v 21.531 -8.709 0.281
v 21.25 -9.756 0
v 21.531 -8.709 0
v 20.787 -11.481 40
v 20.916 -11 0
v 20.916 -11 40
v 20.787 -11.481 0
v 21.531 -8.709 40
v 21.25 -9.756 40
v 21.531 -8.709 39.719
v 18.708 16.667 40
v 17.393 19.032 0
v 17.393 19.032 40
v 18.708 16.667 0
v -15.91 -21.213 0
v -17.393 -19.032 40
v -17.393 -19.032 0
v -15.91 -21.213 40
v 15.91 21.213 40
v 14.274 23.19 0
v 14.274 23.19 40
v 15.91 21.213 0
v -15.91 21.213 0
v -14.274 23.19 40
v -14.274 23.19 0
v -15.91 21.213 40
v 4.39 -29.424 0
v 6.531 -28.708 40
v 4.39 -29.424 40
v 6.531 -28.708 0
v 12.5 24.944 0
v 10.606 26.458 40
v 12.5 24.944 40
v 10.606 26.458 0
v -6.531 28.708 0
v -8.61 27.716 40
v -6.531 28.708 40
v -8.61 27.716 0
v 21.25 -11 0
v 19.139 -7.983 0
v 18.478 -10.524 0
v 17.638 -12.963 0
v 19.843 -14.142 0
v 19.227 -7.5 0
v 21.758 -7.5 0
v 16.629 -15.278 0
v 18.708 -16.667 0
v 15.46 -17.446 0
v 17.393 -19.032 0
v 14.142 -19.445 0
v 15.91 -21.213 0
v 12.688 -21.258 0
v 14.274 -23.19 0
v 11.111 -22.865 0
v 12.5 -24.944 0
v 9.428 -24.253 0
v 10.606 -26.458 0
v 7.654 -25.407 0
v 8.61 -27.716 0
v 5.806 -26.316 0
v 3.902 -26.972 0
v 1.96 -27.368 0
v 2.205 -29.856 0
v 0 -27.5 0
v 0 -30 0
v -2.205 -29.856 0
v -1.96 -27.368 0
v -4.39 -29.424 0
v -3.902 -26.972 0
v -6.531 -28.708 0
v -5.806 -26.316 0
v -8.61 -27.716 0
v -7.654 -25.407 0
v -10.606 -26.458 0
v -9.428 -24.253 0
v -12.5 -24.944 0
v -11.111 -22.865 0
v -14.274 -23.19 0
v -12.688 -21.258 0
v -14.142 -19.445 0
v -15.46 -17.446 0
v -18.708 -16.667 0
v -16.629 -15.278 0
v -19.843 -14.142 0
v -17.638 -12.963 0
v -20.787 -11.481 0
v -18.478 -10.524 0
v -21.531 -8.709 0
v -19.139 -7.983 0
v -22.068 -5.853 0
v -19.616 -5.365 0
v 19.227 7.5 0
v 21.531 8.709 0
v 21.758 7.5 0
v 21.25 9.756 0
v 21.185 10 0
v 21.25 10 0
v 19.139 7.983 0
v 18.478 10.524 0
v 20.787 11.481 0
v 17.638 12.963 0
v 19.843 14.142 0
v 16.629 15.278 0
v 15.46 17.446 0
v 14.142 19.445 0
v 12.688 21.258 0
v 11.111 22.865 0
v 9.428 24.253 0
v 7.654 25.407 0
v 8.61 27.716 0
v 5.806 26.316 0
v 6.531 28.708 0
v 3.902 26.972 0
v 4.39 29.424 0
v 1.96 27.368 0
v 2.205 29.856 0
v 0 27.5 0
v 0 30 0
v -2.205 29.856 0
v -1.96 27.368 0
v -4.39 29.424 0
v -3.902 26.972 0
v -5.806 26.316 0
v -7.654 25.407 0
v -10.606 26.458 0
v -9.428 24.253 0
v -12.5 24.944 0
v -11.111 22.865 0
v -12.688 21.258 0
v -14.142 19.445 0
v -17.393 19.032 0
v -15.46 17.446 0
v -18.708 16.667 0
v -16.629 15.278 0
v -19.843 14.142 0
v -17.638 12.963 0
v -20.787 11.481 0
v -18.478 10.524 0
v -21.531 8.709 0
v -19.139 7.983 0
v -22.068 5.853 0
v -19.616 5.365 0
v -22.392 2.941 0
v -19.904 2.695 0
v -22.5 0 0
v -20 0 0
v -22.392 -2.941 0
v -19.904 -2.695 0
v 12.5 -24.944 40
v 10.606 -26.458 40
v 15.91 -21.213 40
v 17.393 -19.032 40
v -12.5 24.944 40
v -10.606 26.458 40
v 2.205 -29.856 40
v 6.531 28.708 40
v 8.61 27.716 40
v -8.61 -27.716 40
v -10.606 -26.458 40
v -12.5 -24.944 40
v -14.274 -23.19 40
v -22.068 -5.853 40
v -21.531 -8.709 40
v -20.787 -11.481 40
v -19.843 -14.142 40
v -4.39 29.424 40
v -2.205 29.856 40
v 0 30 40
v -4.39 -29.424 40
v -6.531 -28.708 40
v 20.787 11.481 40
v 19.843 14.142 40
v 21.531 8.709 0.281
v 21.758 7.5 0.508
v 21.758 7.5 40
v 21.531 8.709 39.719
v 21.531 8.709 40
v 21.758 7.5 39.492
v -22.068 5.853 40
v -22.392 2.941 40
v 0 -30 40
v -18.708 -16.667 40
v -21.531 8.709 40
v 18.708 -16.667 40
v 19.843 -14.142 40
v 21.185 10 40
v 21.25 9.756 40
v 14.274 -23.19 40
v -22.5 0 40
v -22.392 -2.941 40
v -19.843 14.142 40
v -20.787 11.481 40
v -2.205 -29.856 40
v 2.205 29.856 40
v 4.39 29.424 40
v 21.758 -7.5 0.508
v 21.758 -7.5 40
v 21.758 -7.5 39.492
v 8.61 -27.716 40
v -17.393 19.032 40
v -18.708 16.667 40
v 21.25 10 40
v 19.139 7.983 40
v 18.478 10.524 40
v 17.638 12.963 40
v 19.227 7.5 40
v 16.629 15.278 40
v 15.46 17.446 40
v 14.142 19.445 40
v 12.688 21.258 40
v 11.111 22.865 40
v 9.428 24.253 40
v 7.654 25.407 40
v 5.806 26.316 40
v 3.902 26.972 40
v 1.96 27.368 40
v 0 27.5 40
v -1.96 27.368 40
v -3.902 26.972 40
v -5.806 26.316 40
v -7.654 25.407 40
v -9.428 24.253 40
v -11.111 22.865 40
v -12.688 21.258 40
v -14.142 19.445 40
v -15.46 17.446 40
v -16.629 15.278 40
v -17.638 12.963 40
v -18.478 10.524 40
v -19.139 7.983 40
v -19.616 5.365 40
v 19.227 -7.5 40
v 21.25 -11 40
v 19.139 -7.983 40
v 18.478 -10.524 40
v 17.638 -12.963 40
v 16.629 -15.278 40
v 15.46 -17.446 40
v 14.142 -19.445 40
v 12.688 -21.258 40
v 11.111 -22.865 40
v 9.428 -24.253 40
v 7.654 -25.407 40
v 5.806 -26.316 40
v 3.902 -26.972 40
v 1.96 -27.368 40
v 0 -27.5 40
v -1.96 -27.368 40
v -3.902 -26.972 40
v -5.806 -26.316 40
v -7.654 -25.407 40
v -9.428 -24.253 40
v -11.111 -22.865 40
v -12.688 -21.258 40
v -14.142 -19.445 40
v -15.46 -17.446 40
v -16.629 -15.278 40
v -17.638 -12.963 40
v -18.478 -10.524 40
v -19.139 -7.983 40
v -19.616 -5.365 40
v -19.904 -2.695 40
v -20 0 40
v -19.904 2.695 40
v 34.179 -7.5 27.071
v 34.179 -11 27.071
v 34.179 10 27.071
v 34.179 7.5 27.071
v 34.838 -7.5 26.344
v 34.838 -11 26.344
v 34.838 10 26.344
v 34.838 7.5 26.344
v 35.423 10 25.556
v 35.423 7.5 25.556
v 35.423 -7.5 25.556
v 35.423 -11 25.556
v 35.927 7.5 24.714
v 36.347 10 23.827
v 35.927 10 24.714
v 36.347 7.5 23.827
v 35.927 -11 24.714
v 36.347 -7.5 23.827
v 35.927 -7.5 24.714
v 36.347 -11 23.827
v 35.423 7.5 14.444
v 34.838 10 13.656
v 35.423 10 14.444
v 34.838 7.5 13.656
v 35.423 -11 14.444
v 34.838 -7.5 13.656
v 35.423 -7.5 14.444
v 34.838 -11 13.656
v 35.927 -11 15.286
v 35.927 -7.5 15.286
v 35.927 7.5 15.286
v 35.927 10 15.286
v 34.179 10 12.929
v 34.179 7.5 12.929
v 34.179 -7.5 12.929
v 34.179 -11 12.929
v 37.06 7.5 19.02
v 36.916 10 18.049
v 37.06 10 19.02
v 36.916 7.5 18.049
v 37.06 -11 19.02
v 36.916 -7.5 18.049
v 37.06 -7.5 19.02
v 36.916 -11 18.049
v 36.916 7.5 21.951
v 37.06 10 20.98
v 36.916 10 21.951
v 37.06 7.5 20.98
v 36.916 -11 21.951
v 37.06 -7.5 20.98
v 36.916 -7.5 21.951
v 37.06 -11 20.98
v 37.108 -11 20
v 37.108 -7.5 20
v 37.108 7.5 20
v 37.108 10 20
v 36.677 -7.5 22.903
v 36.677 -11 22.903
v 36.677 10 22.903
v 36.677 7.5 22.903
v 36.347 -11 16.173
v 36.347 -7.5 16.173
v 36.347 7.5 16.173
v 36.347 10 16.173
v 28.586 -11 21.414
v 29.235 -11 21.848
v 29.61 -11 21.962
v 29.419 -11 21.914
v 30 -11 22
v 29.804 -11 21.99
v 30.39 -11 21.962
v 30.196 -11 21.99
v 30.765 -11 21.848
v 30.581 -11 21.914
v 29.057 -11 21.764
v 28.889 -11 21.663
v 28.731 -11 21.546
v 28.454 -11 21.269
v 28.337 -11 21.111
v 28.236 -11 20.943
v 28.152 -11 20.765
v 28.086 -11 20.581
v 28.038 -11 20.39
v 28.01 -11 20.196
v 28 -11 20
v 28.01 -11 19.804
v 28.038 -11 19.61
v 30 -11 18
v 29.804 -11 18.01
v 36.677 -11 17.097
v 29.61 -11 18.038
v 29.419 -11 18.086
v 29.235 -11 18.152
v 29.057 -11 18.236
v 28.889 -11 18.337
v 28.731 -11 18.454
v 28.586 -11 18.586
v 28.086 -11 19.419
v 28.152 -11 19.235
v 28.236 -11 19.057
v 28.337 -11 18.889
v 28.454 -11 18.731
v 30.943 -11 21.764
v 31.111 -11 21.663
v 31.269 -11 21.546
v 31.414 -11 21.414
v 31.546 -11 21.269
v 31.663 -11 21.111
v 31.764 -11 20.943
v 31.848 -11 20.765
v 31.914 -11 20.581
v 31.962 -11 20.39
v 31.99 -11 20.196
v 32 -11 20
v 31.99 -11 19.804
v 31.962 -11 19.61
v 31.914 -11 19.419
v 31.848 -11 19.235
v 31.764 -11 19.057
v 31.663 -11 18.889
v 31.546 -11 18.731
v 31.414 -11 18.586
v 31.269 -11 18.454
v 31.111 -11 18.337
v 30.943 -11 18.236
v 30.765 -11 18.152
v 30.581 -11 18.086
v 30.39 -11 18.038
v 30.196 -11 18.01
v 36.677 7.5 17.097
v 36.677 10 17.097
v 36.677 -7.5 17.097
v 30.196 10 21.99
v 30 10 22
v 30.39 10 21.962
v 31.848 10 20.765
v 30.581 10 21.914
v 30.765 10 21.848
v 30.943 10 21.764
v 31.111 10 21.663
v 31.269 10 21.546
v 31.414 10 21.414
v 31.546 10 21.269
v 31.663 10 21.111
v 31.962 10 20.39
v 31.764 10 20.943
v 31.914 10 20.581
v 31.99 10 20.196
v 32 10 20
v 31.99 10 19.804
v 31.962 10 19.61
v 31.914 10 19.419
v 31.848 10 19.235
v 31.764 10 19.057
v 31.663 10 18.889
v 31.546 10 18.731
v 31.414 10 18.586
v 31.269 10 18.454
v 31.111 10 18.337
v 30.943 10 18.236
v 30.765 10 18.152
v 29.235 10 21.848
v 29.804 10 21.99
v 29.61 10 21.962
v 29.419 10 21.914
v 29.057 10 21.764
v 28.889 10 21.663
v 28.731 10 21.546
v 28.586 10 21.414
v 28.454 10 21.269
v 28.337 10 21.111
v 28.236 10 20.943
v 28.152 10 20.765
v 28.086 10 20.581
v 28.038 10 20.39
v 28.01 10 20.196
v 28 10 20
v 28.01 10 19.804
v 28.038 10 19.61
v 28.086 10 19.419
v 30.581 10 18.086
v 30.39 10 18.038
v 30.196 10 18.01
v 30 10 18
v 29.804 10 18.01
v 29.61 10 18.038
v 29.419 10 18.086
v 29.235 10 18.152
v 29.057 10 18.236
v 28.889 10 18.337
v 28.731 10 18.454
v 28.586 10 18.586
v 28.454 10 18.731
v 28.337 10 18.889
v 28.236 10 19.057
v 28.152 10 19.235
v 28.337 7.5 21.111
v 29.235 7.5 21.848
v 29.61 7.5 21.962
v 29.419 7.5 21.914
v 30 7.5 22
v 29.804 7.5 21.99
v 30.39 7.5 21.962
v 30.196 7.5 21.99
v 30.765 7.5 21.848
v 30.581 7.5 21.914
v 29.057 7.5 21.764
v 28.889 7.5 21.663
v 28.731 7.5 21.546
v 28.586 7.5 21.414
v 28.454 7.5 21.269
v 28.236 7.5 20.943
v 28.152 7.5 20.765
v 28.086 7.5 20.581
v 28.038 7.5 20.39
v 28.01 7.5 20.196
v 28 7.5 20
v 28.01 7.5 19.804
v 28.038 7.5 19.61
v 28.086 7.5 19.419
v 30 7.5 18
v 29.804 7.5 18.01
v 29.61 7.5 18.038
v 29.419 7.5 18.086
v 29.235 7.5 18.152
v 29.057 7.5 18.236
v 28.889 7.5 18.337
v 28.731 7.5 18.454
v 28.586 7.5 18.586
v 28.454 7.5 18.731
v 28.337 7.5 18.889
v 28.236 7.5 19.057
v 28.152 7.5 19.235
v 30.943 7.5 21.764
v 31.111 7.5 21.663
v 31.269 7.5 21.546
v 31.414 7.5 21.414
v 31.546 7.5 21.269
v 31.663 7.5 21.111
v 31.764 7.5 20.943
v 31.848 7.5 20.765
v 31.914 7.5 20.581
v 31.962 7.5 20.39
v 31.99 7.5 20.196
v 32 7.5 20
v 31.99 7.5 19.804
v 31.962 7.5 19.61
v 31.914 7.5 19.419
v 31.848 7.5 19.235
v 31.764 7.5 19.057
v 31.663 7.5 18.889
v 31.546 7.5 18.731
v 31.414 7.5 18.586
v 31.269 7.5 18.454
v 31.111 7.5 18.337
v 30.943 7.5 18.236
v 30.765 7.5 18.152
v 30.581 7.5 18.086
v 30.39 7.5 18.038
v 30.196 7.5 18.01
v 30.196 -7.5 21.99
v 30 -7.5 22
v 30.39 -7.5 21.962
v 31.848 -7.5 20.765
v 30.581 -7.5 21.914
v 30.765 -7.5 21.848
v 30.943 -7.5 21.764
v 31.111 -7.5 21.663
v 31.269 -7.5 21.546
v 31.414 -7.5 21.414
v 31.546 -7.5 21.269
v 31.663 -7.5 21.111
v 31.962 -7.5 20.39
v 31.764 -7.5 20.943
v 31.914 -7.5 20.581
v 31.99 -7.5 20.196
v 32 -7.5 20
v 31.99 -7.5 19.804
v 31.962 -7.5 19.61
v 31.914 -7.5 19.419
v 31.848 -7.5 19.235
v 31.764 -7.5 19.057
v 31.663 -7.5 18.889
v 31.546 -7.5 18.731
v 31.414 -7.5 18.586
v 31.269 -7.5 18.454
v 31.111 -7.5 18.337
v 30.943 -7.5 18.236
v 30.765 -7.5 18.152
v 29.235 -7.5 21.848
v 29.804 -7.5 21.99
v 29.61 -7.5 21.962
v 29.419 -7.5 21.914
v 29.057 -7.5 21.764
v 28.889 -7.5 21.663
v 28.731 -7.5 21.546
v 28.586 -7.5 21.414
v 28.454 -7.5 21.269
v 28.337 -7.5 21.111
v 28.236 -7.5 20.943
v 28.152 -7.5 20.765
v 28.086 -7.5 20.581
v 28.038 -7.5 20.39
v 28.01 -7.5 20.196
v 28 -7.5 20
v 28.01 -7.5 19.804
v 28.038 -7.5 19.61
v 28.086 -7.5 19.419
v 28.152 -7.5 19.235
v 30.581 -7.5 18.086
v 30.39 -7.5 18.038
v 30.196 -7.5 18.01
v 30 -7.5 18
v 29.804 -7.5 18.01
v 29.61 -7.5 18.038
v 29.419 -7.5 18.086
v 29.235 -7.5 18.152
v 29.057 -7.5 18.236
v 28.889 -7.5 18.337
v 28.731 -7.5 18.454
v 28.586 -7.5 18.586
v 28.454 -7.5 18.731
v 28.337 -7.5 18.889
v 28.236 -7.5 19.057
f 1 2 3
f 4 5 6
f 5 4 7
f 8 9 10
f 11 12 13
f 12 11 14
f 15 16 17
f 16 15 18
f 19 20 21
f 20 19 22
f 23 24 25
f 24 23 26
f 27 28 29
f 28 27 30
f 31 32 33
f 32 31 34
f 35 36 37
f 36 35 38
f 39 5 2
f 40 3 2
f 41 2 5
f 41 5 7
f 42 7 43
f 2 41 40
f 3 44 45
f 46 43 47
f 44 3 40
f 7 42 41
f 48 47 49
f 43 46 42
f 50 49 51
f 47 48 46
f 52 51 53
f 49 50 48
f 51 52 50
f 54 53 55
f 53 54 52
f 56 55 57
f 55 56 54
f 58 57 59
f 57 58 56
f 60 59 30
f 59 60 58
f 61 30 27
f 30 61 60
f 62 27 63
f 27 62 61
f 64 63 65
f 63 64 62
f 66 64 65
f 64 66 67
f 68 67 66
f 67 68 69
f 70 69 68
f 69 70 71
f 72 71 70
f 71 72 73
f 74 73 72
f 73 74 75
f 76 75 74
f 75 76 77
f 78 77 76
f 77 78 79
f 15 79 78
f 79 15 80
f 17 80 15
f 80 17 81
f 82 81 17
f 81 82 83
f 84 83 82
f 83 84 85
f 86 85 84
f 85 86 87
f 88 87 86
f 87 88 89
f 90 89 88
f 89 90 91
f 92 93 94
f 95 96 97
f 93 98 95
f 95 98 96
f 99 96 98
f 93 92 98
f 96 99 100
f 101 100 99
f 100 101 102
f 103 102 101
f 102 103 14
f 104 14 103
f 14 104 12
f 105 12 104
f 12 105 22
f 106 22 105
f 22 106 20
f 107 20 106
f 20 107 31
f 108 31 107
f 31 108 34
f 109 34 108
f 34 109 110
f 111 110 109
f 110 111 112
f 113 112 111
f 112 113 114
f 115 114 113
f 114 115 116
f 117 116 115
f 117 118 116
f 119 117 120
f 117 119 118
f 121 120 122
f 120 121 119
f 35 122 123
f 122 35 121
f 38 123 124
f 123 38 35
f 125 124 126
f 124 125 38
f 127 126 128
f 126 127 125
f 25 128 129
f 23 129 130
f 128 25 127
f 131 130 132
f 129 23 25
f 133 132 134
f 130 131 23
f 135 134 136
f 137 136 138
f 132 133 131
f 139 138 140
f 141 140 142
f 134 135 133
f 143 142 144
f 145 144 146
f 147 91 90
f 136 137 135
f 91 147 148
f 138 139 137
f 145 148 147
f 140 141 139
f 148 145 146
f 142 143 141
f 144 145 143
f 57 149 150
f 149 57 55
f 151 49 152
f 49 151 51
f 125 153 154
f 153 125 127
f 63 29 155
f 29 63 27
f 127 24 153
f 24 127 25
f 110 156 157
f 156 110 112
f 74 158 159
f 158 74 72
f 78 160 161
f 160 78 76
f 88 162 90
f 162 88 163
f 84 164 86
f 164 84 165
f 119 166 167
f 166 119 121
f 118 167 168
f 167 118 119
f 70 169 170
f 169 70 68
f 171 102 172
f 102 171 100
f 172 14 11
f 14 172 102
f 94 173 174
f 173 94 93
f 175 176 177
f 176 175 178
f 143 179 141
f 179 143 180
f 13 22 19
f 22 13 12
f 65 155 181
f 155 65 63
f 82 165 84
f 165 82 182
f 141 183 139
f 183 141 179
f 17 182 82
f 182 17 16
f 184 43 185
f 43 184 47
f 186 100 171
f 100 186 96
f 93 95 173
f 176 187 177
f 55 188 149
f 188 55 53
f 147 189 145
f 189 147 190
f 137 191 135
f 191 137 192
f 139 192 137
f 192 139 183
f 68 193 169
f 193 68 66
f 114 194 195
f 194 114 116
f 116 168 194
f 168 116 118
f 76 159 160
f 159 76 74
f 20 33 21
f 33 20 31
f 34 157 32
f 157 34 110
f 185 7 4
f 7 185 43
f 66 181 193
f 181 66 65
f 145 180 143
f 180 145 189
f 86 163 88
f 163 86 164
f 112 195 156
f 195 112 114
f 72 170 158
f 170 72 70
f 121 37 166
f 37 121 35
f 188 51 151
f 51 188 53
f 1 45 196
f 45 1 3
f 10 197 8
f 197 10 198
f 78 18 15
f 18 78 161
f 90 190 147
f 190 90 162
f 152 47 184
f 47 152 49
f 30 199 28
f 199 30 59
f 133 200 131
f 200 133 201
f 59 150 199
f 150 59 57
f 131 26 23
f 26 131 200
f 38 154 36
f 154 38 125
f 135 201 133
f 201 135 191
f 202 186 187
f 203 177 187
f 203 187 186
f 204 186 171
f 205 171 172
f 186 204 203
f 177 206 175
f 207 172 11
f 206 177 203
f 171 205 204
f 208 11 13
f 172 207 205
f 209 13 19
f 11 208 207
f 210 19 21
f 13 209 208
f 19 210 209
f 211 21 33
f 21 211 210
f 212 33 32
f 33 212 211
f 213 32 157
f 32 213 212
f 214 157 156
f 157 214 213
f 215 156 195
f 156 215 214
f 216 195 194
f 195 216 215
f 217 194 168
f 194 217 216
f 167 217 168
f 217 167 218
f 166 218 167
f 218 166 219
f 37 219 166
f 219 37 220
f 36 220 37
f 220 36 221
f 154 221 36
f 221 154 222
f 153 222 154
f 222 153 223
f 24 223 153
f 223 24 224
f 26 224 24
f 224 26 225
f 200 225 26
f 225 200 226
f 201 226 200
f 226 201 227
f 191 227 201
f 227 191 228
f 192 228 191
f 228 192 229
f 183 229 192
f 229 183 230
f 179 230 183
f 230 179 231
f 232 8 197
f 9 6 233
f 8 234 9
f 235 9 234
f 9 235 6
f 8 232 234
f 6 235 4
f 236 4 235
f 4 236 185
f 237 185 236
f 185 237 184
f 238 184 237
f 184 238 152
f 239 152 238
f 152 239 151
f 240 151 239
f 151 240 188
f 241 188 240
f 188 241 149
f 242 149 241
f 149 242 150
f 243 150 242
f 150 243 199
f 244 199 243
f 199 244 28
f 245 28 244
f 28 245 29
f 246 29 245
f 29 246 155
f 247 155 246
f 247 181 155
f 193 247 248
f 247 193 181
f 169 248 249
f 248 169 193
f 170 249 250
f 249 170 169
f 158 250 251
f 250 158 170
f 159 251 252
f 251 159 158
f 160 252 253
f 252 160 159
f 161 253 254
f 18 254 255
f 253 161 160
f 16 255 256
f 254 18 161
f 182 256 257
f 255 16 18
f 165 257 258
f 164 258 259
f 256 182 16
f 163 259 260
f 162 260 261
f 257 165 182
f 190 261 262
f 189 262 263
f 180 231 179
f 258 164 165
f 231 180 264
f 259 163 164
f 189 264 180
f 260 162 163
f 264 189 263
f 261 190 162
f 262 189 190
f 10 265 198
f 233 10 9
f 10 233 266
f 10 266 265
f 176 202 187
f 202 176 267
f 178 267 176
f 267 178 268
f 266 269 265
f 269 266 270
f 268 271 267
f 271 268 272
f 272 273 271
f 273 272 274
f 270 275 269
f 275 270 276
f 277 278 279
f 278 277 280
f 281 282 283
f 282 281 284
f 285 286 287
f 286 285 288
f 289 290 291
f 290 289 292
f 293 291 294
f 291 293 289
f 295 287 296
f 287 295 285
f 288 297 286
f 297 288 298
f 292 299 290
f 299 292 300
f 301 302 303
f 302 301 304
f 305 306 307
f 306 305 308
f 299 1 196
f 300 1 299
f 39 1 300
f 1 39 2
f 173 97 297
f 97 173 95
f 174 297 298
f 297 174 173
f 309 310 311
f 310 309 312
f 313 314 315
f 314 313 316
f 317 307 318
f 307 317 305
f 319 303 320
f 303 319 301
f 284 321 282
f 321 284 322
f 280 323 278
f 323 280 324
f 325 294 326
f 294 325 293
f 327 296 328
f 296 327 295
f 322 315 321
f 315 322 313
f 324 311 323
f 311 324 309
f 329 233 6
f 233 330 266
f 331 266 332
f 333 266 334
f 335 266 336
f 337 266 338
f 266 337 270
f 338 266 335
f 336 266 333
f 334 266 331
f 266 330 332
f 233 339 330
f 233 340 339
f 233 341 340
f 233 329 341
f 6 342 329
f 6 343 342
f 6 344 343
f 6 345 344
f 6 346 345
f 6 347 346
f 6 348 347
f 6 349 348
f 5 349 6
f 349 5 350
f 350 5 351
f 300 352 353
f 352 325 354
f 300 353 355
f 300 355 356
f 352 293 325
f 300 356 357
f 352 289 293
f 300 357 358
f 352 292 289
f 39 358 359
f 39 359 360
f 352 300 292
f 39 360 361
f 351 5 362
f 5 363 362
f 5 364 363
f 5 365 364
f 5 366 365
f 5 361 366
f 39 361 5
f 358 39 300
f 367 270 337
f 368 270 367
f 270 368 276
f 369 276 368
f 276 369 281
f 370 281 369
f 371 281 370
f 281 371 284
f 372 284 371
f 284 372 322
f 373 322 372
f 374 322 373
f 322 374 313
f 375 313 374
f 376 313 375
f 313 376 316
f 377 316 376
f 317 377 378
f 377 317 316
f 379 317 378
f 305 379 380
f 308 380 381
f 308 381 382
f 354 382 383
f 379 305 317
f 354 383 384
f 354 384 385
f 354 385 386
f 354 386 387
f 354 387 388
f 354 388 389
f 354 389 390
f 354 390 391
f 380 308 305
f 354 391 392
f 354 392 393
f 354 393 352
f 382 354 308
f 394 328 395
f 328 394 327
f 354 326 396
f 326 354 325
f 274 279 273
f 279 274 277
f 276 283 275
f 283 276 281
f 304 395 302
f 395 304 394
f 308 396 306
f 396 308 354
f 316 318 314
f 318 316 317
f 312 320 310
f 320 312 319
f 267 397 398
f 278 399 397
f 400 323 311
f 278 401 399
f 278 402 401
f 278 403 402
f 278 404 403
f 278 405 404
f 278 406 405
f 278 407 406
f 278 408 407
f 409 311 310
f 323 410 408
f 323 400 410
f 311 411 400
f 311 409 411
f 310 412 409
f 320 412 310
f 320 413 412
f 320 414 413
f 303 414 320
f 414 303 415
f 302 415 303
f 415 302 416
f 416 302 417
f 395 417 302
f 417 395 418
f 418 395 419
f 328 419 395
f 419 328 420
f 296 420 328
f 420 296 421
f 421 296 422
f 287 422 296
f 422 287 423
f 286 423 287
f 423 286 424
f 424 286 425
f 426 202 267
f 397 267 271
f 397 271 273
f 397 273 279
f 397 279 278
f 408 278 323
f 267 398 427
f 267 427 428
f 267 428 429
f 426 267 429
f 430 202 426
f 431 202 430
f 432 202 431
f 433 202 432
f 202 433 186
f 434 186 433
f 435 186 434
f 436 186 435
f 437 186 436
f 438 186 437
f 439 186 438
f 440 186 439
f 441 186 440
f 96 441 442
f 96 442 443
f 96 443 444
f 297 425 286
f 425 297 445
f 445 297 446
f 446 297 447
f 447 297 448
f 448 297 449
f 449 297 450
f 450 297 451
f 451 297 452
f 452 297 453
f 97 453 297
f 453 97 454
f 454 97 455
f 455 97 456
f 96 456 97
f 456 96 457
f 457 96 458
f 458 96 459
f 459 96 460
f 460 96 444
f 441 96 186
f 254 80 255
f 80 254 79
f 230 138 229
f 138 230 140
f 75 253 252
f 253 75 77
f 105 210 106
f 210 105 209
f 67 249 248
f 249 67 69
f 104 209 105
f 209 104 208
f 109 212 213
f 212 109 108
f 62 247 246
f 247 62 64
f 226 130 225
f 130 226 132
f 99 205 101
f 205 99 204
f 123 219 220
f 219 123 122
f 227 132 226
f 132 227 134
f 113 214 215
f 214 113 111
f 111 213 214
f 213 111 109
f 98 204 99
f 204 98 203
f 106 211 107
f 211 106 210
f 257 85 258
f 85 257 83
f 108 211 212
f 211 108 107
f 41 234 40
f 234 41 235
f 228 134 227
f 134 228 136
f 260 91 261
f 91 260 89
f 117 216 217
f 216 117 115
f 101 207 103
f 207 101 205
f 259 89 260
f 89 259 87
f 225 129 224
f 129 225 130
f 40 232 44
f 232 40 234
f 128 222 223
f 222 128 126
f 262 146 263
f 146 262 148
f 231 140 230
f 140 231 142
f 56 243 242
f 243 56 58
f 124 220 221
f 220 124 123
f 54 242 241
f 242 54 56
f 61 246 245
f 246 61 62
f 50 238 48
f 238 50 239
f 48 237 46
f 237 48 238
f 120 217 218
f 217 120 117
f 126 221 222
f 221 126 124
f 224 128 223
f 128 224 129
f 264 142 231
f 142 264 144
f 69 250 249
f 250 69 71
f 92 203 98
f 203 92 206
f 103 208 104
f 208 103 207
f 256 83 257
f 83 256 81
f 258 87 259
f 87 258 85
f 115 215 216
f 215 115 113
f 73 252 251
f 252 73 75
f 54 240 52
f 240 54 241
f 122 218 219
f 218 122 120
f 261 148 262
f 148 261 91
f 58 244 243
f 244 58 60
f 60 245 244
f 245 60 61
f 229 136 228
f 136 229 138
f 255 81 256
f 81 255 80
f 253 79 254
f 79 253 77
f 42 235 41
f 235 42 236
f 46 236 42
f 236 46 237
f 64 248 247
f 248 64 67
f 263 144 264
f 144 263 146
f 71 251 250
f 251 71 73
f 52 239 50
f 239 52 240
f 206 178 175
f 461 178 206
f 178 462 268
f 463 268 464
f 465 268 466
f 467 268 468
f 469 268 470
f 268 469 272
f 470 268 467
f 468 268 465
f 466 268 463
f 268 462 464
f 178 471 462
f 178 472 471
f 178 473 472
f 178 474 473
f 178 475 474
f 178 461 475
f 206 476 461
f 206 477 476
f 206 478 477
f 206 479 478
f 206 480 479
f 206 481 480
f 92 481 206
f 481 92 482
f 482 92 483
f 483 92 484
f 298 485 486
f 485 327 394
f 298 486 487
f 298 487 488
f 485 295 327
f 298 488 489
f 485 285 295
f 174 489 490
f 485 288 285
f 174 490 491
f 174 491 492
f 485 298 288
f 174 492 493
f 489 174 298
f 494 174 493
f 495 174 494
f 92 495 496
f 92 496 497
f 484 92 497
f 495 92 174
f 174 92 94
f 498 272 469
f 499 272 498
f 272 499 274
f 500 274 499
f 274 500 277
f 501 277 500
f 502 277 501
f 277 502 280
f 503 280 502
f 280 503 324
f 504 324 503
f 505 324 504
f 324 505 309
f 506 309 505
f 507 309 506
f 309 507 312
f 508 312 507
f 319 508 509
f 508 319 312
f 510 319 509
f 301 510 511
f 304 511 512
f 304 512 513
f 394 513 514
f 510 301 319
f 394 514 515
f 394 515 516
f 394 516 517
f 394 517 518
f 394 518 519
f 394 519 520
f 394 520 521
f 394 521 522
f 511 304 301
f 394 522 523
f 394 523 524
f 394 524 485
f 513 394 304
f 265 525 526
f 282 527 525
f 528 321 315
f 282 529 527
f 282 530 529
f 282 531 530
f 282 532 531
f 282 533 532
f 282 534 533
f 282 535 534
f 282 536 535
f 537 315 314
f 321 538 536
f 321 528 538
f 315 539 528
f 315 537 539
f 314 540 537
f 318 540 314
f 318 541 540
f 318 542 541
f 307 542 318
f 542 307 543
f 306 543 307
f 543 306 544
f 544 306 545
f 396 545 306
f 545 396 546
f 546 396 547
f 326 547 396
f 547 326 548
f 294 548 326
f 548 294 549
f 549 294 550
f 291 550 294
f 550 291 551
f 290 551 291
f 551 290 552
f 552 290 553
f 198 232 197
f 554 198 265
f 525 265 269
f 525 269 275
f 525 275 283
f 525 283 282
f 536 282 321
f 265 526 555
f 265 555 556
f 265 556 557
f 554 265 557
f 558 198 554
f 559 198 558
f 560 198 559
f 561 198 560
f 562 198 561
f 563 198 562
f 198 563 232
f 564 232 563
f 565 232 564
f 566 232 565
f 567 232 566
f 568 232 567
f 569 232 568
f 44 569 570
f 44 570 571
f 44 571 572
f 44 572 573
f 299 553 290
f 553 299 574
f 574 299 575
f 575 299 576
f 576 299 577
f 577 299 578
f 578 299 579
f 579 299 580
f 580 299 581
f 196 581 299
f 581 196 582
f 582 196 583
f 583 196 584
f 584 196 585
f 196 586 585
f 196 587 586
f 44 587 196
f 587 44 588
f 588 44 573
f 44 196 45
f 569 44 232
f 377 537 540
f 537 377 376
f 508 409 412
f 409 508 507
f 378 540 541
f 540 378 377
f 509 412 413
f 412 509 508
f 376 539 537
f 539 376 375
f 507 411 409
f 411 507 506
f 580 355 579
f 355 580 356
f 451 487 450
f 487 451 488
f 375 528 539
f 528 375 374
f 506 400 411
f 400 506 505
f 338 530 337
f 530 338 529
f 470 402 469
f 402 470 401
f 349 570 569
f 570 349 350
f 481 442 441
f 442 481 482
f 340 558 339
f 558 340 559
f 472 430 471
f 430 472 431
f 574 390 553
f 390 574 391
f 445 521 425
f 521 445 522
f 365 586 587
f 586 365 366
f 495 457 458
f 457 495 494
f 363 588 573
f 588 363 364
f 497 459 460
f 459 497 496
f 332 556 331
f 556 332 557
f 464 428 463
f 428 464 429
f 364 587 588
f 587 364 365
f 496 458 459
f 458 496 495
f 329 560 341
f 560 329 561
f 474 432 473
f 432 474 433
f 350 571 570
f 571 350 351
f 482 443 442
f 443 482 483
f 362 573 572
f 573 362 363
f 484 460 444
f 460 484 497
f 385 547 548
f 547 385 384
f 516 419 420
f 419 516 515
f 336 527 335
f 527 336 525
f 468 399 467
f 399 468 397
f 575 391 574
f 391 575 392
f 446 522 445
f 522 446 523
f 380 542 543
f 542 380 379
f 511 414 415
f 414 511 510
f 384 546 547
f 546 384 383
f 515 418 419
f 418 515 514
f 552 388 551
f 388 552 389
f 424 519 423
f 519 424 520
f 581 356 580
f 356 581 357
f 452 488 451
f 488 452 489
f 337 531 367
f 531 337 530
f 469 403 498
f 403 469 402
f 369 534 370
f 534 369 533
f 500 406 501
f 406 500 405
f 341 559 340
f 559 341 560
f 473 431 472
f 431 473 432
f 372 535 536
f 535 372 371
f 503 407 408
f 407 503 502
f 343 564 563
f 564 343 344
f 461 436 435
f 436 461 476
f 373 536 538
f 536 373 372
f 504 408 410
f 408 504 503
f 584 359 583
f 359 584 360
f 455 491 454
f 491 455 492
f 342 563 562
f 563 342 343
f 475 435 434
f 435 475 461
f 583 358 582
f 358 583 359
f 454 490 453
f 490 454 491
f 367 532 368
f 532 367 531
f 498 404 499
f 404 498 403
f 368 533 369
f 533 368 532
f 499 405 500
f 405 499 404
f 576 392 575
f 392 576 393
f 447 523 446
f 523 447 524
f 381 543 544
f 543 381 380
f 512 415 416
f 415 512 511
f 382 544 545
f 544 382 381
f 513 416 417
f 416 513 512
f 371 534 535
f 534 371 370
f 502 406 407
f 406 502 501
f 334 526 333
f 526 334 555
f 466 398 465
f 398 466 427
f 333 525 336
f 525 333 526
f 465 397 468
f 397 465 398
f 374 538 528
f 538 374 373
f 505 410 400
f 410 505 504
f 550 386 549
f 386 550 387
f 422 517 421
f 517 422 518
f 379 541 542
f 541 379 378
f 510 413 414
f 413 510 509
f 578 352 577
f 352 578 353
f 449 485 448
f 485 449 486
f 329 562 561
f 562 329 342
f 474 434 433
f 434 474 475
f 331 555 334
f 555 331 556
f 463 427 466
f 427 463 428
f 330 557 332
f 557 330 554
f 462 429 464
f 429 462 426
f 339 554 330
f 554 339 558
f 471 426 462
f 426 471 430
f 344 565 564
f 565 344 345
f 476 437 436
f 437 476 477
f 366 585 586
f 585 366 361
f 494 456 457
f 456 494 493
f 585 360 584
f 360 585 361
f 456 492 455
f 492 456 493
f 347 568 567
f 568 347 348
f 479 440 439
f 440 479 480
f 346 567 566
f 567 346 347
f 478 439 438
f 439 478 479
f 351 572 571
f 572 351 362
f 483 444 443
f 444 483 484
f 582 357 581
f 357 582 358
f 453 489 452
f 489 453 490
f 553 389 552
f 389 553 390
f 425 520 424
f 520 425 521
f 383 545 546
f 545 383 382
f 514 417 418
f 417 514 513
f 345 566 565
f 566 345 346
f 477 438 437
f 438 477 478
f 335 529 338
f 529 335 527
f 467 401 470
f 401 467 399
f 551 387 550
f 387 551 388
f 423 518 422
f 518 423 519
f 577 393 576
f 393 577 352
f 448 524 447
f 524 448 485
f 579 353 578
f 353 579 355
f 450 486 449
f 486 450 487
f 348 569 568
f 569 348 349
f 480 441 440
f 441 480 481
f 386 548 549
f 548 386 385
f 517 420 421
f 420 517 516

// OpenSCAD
$fn=64;
fixture_height=40;
width=5;
frame_diameter=40;
wing_length=20;
wing_width=20;
wing_radius=10;
hole_diameter=4;

wing_base=20;
wing_shift=(frame_diameter+width/2)/2-(wing_base+2*wing_radius)/sqrt(2)+fixture_height/2;

difference() {
    union() {
        // core
        resize([40+width,55+width]) cylinder(h=fixture_height, d=frame_diameter+width);
        // wing core
        translate([wing_shift,0,fixture_height/2]) minkowski() { 
            rotate([0,45,0]) cube([wing_base, wing_width, wing_base], center = true);
            rotate([90,0,0]) cylinder(r=wing_radius,h=1);
        }
    }
    // remove core middle
    resize([40,55]) translate([0,0,-1]) cylinder(h=fixture_height+2, d=frame_diameter);
    // remove wing middle
    translate([frame_diameter-2*width, 0, fixture_height/2]) cube([wing_length+frame_diameter, wing_width-width, fixture_height+2], center = true);
    // screw hole
    translate([frame_diameter/2+wing_length/2,0,fixture_height/2]) rotate([90,0,0]) cylinder(d=hole_diameter, h=frame_diameter, center = true);
    translate([0,0,frame_diameter+fixture_height]) cube(2*frame_diameter, center=true);  // remove top residue
    translate([0,0,-frame_diameter]) cube(2*frame_diameter, center=true);  // remove bottom residue
}
